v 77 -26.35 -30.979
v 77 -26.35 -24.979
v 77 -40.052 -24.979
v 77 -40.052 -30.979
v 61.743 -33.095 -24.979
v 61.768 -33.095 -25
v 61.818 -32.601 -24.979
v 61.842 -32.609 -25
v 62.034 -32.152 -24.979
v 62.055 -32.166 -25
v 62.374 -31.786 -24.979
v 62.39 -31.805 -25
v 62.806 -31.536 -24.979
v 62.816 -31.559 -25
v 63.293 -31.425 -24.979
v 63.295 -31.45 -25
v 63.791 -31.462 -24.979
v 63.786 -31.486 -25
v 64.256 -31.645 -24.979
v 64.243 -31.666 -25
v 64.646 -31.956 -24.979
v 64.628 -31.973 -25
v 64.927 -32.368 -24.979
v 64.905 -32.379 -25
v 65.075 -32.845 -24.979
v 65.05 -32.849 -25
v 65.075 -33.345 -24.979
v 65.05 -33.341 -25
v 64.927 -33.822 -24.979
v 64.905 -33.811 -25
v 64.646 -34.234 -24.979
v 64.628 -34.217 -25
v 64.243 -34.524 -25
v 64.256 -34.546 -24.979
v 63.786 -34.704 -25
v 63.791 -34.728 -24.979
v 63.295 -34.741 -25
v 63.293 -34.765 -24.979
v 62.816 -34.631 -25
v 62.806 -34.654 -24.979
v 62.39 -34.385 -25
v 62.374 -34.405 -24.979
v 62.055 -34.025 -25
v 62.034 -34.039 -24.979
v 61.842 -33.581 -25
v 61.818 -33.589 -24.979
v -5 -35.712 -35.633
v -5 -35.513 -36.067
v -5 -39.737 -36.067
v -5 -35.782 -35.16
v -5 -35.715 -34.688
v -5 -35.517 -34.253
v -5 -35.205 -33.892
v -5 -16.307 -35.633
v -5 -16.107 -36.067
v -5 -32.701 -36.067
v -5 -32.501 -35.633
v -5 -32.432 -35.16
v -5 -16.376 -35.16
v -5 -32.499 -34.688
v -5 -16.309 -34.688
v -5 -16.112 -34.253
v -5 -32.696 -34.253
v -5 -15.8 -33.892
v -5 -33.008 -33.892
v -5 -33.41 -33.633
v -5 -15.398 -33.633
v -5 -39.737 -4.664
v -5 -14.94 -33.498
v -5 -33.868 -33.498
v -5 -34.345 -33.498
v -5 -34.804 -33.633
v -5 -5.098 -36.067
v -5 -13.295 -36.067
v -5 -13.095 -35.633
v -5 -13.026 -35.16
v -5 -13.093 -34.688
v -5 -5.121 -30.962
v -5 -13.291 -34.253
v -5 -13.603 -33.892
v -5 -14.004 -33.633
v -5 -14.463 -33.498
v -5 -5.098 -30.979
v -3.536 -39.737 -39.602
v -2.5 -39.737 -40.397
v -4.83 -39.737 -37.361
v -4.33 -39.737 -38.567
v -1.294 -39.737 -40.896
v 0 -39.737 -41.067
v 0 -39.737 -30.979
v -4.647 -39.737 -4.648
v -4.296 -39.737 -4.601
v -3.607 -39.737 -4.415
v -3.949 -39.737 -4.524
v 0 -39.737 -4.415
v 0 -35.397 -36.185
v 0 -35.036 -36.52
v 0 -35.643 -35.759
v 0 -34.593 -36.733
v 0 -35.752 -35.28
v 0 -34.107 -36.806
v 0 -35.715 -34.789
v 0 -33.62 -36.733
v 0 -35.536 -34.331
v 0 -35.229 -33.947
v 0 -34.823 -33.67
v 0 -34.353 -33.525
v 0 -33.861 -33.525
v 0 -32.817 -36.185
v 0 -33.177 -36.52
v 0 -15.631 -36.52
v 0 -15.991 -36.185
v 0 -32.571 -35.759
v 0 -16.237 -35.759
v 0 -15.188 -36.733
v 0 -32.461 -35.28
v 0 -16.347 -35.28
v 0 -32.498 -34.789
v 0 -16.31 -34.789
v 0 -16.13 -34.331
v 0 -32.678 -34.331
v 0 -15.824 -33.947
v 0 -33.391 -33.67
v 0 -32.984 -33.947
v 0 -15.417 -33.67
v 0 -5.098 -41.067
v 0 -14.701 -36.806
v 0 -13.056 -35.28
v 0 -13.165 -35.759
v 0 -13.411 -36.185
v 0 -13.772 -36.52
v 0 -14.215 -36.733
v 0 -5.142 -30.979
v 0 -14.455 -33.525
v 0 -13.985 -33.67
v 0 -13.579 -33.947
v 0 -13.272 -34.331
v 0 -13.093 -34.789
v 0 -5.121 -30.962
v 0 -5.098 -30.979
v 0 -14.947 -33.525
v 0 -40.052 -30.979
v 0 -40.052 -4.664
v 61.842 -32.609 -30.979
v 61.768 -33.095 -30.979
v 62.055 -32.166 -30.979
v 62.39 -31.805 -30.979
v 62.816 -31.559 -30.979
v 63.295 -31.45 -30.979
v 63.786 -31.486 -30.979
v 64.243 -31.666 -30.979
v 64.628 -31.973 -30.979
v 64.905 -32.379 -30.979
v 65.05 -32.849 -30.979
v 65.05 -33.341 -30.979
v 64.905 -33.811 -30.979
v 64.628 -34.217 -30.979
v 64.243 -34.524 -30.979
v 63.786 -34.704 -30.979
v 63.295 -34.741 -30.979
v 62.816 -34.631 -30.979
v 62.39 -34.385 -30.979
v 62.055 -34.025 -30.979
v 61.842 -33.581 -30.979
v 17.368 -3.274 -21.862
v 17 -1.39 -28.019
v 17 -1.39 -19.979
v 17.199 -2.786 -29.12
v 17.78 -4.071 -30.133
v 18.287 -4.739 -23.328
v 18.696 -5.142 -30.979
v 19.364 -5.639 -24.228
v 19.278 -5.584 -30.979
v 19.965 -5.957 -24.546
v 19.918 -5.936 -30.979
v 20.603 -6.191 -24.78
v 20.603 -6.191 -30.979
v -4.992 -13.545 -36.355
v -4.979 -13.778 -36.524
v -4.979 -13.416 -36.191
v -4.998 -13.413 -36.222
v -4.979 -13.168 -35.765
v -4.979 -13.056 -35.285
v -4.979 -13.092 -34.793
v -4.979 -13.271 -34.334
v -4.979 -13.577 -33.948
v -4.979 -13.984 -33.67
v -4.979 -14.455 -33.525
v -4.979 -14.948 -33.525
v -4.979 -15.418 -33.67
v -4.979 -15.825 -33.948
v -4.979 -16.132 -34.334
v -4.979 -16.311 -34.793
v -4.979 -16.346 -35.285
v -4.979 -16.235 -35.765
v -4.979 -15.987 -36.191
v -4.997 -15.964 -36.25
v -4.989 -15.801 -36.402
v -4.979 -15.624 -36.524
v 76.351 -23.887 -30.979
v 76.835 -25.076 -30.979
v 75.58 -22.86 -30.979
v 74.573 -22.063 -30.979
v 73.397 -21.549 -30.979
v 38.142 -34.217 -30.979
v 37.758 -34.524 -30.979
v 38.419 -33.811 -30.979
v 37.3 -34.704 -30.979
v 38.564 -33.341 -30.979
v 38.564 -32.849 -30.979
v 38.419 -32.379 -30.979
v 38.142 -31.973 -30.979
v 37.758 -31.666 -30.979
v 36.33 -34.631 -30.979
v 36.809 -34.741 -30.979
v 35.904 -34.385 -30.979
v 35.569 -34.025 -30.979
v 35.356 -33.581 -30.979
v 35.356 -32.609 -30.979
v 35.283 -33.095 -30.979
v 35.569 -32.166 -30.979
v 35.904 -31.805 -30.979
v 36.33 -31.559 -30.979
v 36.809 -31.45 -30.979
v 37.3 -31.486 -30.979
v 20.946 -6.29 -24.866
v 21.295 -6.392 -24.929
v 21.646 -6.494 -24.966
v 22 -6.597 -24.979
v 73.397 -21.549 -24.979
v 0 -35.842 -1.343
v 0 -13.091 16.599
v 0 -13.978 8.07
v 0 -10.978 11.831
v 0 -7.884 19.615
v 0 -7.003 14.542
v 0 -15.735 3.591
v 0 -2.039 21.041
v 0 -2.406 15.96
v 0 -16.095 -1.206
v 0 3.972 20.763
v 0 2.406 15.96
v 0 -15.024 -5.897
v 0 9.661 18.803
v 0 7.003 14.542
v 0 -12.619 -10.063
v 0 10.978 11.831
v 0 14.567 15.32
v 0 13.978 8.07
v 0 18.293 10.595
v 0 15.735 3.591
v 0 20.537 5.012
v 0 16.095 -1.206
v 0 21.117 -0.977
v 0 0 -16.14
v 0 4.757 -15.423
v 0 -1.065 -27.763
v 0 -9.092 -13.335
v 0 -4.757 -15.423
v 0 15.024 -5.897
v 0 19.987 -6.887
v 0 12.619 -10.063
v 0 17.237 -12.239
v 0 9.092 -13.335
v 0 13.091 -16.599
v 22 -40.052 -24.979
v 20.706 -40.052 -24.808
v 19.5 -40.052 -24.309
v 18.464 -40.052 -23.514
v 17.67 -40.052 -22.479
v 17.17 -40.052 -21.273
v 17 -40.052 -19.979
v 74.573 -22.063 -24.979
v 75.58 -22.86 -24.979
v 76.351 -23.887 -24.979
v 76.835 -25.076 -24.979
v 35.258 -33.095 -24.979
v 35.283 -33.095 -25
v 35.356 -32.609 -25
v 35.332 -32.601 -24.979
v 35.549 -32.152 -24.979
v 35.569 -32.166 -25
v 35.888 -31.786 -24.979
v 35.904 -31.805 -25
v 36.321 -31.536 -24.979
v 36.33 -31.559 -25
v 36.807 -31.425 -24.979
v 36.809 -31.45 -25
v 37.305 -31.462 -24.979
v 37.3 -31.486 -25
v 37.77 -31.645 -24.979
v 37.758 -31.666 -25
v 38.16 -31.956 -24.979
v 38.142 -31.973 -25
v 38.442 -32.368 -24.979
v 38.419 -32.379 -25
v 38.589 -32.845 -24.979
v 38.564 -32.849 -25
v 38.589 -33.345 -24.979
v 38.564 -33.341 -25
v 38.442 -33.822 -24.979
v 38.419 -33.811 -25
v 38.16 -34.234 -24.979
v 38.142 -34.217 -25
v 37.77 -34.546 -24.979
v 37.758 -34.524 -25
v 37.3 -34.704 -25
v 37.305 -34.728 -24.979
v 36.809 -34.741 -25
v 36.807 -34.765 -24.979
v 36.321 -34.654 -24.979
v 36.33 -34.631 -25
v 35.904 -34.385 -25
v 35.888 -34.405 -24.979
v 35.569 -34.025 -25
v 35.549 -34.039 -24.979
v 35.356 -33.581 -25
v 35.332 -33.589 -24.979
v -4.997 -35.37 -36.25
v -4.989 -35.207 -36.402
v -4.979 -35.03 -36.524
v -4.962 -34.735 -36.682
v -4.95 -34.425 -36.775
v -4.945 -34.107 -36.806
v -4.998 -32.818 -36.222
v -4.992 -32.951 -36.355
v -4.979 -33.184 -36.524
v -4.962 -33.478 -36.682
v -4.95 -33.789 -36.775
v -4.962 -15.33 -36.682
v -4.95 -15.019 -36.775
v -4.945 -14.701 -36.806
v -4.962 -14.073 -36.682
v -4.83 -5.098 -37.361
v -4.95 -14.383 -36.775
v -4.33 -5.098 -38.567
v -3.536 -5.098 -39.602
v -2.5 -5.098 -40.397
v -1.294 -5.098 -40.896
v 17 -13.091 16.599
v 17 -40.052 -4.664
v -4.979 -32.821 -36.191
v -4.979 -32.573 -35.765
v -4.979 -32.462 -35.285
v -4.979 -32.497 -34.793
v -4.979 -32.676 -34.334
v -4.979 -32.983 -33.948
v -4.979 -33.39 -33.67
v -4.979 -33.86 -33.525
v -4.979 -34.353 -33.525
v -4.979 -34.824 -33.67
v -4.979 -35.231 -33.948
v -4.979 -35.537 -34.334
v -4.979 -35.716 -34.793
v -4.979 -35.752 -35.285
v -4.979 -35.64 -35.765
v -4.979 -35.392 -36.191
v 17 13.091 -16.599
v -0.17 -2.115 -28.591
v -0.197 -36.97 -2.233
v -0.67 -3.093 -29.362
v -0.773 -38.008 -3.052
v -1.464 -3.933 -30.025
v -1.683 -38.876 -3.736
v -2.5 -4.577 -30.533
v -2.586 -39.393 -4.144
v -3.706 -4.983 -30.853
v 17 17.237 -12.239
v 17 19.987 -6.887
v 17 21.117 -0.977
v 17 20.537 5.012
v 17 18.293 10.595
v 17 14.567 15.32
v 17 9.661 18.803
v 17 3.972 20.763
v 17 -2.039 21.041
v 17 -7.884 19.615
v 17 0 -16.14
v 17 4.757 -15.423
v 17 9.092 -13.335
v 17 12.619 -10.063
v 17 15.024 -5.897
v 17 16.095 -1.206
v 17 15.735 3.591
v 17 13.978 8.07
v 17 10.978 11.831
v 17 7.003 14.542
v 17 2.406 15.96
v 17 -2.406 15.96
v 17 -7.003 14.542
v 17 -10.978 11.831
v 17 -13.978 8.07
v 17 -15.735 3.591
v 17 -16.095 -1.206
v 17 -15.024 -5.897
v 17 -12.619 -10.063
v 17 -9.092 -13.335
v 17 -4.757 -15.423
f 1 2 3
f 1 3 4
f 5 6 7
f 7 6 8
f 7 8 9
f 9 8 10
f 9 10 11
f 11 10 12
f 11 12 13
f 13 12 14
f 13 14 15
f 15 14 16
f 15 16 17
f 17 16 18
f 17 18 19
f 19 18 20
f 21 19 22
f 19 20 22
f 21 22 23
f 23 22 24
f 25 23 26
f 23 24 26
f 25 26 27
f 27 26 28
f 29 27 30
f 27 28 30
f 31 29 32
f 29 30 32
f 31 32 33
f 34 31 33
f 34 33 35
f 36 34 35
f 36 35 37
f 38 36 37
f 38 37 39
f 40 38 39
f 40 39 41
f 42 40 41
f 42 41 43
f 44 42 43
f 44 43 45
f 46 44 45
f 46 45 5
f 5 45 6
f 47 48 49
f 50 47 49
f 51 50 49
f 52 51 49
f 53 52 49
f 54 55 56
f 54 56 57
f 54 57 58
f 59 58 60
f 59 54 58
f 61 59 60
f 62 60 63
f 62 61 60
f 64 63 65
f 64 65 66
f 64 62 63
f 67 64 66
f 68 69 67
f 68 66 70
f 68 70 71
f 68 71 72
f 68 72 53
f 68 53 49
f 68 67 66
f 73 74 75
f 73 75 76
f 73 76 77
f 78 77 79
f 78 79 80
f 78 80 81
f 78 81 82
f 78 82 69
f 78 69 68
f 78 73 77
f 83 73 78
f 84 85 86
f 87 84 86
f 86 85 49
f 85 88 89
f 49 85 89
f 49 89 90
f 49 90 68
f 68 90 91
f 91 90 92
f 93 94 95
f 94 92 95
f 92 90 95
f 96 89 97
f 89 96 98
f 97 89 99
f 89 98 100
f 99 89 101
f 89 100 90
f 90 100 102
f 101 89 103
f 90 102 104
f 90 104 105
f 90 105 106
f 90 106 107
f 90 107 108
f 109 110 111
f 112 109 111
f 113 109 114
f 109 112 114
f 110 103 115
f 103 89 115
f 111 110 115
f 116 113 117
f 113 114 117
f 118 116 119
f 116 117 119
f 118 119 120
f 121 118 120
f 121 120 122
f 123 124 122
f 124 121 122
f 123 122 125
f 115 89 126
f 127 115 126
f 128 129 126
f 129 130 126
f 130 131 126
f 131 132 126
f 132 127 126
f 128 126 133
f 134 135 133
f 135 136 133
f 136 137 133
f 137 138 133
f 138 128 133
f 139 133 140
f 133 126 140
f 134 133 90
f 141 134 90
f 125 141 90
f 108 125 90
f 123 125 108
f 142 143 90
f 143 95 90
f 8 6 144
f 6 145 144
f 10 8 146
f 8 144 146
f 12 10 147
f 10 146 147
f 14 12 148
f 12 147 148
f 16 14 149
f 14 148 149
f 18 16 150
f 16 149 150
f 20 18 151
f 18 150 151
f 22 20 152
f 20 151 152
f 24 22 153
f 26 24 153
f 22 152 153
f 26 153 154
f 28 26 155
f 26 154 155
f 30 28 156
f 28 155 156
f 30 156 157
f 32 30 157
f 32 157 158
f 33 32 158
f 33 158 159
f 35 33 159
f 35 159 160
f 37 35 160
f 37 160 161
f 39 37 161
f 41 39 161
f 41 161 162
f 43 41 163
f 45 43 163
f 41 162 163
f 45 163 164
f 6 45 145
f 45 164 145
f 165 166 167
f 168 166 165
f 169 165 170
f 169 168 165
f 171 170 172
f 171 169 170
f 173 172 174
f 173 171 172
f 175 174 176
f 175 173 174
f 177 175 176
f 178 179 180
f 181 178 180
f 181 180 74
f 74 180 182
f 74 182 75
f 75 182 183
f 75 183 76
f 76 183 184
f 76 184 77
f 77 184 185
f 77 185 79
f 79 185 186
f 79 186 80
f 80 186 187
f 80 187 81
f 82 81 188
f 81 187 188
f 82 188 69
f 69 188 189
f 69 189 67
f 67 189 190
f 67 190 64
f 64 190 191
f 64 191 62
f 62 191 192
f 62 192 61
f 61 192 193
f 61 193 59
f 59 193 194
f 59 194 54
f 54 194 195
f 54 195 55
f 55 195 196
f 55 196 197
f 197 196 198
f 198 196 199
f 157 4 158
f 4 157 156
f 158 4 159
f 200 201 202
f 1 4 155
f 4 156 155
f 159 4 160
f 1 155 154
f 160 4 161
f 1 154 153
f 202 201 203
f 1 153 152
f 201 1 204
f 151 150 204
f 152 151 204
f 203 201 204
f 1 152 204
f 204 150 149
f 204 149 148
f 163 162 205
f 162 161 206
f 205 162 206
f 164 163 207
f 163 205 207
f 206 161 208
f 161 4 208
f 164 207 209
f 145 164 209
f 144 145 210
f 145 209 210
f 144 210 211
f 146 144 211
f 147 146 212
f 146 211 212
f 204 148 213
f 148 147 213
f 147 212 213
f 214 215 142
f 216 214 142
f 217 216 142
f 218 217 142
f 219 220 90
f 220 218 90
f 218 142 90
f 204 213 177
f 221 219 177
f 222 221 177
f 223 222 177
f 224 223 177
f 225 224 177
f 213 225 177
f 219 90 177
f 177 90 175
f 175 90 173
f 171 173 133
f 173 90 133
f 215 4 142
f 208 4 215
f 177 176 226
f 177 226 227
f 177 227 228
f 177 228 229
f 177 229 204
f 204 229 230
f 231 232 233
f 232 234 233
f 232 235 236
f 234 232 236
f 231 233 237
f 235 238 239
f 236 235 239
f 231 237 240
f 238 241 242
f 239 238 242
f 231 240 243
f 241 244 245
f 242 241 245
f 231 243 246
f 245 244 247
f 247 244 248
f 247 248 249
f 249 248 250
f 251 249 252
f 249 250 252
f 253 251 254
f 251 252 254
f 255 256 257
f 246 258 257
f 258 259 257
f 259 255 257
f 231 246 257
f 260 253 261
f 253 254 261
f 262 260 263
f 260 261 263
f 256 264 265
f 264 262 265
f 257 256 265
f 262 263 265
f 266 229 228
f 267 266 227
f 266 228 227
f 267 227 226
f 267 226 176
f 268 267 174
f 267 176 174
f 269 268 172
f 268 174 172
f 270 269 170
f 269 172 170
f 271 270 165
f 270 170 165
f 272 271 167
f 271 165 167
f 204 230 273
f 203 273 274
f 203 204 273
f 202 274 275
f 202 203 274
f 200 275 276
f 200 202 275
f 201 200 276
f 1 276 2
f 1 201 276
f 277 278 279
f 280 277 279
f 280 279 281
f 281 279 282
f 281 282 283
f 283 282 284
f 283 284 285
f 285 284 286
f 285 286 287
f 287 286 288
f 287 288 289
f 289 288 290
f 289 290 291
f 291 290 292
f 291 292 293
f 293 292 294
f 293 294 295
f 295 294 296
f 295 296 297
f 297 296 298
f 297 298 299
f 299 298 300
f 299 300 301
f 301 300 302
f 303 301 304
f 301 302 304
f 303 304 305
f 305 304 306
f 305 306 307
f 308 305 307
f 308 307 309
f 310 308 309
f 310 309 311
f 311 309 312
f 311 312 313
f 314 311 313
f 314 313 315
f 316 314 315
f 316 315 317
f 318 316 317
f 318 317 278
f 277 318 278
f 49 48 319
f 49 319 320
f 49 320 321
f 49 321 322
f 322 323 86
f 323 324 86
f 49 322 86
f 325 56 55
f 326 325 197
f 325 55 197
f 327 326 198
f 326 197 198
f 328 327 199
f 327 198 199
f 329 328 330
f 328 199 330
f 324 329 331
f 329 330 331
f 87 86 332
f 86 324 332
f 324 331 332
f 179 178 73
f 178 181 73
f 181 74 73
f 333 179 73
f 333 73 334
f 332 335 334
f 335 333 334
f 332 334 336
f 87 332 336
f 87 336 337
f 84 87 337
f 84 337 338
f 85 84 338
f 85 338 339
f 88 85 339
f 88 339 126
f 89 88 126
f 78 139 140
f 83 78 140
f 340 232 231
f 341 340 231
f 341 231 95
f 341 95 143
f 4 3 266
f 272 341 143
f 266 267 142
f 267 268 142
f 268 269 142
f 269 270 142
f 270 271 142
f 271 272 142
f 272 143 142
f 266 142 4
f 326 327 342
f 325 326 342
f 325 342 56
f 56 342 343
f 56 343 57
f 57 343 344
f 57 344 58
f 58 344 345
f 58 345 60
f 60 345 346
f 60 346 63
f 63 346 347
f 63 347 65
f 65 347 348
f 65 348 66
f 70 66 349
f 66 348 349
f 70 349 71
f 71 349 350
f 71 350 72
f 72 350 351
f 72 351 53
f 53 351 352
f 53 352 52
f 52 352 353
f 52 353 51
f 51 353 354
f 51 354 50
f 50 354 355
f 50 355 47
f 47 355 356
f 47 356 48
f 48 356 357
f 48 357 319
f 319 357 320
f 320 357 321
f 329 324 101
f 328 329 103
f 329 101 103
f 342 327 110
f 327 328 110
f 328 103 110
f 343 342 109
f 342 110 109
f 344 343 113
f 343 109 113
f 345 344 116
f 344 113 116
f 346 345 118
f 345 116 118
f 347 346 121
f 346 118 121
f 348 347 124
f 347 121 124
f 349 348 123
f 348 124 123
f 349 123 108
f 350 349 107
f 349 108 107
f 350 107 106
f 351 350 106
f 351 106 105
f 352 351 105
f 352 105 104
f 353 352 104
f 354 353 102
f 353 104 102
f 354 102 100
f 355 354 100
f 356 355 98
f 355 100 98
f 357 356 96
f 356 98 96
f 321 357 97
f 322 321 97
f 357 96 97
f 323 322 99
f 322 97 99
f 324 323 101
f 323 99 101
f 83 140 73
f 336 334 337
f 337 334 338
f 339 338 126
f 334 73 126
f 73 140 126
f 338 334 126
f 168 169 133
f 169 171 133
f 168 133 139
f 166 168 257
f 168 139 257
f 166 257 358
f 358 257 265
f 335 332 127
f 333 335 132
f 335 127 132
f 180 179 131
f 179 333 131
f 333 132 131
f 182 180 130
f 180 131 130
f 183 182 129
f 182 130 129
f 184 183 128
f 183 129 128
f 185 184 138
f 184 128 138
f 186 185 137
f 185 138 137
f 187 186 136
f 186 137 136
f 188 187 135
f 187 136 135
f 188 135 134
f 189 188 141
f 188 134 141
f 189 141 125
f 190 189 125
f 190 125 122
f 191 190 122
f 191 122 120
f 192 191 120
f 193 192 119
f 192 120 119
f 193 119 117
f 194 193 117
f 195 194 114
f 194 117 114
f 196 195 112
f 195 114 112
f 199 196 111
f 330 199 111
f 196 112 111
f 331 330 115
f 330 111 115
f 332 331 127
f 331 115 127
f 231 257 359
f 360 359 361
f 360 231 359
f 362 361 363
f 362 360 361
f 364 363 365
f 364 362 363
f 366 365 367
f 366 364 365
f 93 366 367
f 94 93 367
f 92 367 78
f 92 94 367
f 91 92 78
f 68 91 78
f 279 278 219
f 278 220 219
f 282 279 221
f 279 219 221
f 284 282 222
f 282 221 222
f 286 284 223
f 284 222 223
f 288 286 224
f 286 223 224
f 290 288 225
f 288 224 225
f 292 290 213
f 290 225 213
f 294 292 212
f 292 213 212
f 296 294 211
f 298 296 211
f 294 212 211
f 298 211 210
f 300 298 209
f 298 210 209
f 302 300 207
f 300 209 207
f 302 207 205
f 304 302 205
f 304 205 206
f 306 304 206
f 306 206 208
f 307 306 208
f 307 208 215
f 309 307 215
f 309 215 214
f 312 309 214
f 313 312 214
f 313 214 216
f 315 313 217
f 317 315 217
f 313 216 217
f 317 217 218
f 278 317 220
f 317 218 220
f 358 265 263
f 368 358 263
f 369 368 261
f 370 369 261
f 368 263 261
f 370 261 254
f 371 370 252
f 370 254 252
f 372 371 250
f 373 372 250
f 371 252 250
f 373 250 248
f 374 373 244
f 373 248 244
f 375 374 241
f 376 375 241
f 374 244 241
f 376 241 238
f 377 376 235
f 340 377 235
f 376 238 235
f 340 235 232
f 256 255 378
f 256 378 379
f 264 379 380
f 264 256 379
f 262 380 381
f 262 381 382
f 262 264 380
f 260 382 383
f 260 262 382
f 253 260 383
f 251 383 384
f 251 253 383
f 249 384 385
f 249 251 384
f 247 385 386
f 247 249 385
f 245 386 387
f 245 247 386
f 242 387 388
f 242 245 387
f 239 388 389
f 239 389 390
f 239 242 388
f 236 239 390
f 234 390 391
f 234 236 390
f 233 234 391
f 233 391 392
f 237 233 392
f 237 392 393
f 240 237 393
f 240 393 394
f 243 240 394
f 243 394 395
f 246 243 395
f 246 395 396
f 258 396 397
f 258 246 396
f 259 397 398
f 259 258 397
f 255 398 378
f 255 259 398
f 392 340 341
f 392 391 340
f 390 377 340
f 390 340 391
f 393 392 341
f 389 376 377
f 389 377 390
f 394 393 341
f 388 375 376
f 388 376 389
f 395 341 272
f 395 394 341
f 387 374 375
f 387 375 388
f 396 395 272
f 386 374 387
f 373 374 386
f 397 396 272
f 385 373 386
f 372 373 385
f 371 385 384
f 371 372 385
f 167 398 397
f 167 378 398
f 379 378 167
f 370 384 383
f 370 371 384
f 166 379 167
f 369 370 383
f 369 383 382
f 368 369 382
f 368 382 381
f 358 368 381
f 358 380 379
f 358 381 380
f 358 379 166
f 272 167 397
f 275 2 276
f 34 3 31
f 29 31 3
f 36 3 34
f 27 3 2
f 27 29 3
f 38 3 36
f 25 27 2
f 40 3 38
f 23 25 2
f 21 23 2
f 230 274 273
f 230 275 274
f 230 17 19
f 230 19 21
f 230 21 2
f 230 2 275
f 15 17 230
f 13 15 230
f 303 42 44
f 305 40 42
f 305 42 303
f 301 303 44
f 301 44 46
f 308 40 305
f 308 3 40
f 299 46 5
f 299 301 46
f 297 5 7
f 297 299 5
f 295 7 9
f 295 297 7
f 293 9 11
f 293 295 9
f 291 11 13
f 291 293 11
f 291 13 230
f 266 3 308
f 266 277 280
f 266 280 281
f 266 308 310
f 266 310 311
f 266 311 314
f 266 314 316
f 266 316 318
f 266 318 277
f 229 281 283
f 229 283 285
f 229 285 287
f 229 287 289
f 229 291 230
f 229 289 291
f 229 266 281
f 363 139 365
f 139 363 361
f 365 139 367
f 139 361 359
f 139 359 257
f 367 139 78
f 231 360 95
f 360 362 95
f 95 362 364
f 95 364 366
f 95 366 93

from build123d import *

# Parameters (mm, degrees)
SKETCH1_R                             = 21.14
SKETCH1_R_2                           = 16.14
BOSS_EXTRUDE1_DEPTH                   = 17
BOSS_EXTRUDE2_DEPTH                   = 17
SKETCH3_W                             = 6
SKETCH3_H                             = 34.909785338
BOSS_EXTRUDE3_DEPTH                   = 60
CUT_EXTRUDE1_DEPTH                    = 30
FILLET1_R                             = 5
BOSS_EXTRUDE4_DEPTH                   = 5
FILLET2_R                             = 5
TAP_DRILL_FOR_M4X0_7_TAP1_D           = 3.3
TAP_DRILL_FOR_M4X0_7_TAP1_DEPTH       = 5
TAP_DRILL_FOR_M4X0_7_TAP1_CSINK_D     = 3.35
TAP_DRILL_FOR_M4X0_7_TAP1_CSINK_ANGLE = 100
TAP_DRILL_FOR_M4X0_7_TAP1_TIP         = 0.991420021
TAP_DRILL_FOR_M4X0_7_TAP2_D           = 3.3
TAP_DRILL_FOR_M4X0_7_TAP2_DEPTH       = 7
TAP_DRILL_FOR_M4X0_7_TAP2_CSINK_D     = 3.35
TAP_DRILL_FOR_M4X0_7_TAP2_CSINK_ANGLE = 100
TAP_DRILL_FOR_M4X0_7_TAP2_TIP         = 0.991420021


with BuildPart() as part:
    # Sketch1 → Boss-Extrude1 (new body)
    with BuildSketch(Plane(origin=(0, 0, 0), x_dir=(0, 0, -1), z_dir=(1, 0, 0))):
        Circle(SKETCH1_R)
        Circle(SKETCH1_R_2, mode=Mode.SUBTRACT)
    extrude(amount=BOSS_EXTRUDE1_DEPTH)

    # Sketch2 → Boss-Extrude2 (add)
    with BuildSketch(Plane.ZY):
        with BuildLine():
            Line((-30.978599342, -40.052160935), (-30.978599342, -5.142375597))
            Line((-30.978599342, -5.142375597), (-16.599116733, 13.09079538))
            ThreePointArc((-16.599116733, 13.09079538), (-13.09079538, -16.599116733), (16.599116733, -13.09079538))
            Line((16.599116733, -13.09079538), (-4.663804983, -40.052160935))
            Line((-4.663804983, -40.052160935), (-30.978599342, -40.052160935))
        make_face()
    extrude(amount=-BOSS_EXTRUDE2_DEPTH)

    # Sketch3 → Boss-Extrude3 (add)
    with BuildSketch(Plane(origin=(17, 0, 0), x_dir=(0, 0, -1), z_dir=(1, 0, 0))):
        with Locations((27.978599342, -22.597268266)):
            Rectangle(SKETCH3_W, SKETCH3_H)
    extrude(amount=BOSS_EXTRUDE3_DEPTH)

    # Sketch4 → Cut-Extrude1 (cut)
    with BuildSketch(Plane.XY.offset(-24.978599342)):
        Polygon((17, -5.142375597), (77, -22.597268266), (77, -5.142375597), align=None)
    extrude(amount=-CUT_EXTRUDE1_DEPTH, mode=Mode.SUBTRACT)

    # Fillet1
    fillet1_edges = [part.edges().sort_by_distance(p)[0] for p in [
        (17, -5.142375597, -27.978599342),
        (17, -22.597268266, -24.978599342),
        (77, -22.597268266, -27.978599342),
    ]]
    fillet(fillet1_edges, radius=FILLET1_R)

    # Sketch5 → Boss-Extrude4 (add)
    with BuildSketch(Plane.ZY):
        Polygon((-30.978599342, -5.098400642), (-41.06651396, -5.098400642), (-41.06651396, -39.736841718), (-25.501919328, -39.736841718), (-4.663804983, -39.736841718), align=None)
    extrude(amount=BOSS_EXTRUDE4_DEPTH)

    # Fillet2
    # the kernel refuses this fillet: 5 mm, written as the material it adds along each edge
    with BuildSketch(Plane(origin=(0, -49.690311531, 2.897837608), x_dir=(0, 0.604931407257239, 0.7962775850881252), z_dir=(0, 0.7962775850881253, -0.604931407257239))) as fillet2_piece_1_section:
        with BuildLine():
            CenterArc((FILLET2_R, -FILLET2_R), FILLET2_R, 90, 90)
            Line((0, -FILLET2_R), (0, 0))
            Line((0, 0), (FILLET2_R, 0))
        make_face()
    fillet2_piece_1 = extrude(amount=68.472330766, mode=Mode.PRIVATE)
    fillet2_piece_1 = split(fillet2_piece_1, bisect_by=Plane(origin=(-1.128828845, -8.634761076, -33.732848524), z_dir=(0, -0.6192429224168574, 0.7851994670379179)), keep=Keep.TOP, mode=Mode.PRIVATE)
    fillet2_piece_1 = split(fillet2_piece_1, bisect_by=Plane(origin=(-1.128828845, -34.816351836, -0.534615058), z_dir=(0, 0.6192429224168575, -0.7851994670379177)), keep=Keep.TOP, mode=Mode.PRIVATE)
    fillet2_piece_1 = split(fillet2_piece_1, bisect_by=Plane(origin=(-1.128828845, -39.736841718, -16.726060425), z_dir=(0, 1, 0)), keep=Keep.TOP, mode=Mode.PRIVATE)
    add(fillet2_piece_1)
    # the kernel refuses this fillet: 5 mm, written as the material it takes off along each edge
    with BuildSketch(Plane(origin=(-5, 7.401599358, -41.06651396), x_dir=(0, 0, 1), z_dir=(0, -1, 0))) as fillet2_2_piece_1:
        with BuildLine():
            CenterArc((FILLET2_R, -FILLET2_R), FILLET2_R, 90, 90)
            Line((0, -FILLET2_R), (0, 0))
            Line((0, 0), (FILLET2_R, 0))
        make_face()
    extrude(amount=59.638441075, mode=Mode.SUBTRACT)

    # Tap Drill for M4x0.7 Tap1
    with Locations(Plane.ZY.offset(5)):
        with Locations((-35.156261267, -14.70127854), (-35.156261267, -34.106690994)):
            CounterSinkHole(TAP_DRILL_FOR_M4X0_7_TAP1_D / 2, TAP_DRILL_FOR_M4X0_7_TAP1_CSINK_D / 2, depth=TAP_DRILL_FOR_M4X0_7_TAP1_DEPTH, counter_sink_angle=TAP_DRILL_FOR_M4X0_7_TAP1_CSINK_ANGLE)
            with Locations((0, 0, -(TAP_DRILL_FOR_M4X0_7_TAP1_DEPTH + TAP_DRILL_FOR_M4X0_7_TAP1_TIP / 2))):  # 118° drill point
                Cone(0, TAP_DRILL_FOR_M4X0_7_TAP1_D / 2, TAP_DRILL_FOR_M4X0_7_TAP1_TIP, mode=Mode.SUBTRACT)

    # Tap Drill for M4x0.7 Tap2
    with Locations(Plane.XY.offset(-24.978599342)):
        with Locations((36.93257039, -33.095127913), (63.418354043, -33.095127913)):
            CounterSinkHole(TAP_DRILL_FOR_M4X0_7_TAP2_D / 2, TAP_DRILL_FOR_M4X0_7_TAP2_CSINK_D / 2, depth=TAP_DRILL_FOR_M4X0_7_TAP2_DEPTH, counter_sink_angle=TAP_DRILL_FOR_M4X0_7_TAP2_CSINK_ANGLE)
            with Locations((0, 0, -(TAP_DRILL_FOR_M4X0_7_TAP2_DEPTH + TAP_DRILL_FOR_M4X0_7_TAP2_TIP / 2))):  # 118° drill point
                Cone(0, TAP_DRILL_FOR_M4X0_7_TAP2_D / 2, TAP_DRILL_FOR_M4X0_7_TAP2_TIP, mode=Mode.SUBTRACT)


solid = part.part
